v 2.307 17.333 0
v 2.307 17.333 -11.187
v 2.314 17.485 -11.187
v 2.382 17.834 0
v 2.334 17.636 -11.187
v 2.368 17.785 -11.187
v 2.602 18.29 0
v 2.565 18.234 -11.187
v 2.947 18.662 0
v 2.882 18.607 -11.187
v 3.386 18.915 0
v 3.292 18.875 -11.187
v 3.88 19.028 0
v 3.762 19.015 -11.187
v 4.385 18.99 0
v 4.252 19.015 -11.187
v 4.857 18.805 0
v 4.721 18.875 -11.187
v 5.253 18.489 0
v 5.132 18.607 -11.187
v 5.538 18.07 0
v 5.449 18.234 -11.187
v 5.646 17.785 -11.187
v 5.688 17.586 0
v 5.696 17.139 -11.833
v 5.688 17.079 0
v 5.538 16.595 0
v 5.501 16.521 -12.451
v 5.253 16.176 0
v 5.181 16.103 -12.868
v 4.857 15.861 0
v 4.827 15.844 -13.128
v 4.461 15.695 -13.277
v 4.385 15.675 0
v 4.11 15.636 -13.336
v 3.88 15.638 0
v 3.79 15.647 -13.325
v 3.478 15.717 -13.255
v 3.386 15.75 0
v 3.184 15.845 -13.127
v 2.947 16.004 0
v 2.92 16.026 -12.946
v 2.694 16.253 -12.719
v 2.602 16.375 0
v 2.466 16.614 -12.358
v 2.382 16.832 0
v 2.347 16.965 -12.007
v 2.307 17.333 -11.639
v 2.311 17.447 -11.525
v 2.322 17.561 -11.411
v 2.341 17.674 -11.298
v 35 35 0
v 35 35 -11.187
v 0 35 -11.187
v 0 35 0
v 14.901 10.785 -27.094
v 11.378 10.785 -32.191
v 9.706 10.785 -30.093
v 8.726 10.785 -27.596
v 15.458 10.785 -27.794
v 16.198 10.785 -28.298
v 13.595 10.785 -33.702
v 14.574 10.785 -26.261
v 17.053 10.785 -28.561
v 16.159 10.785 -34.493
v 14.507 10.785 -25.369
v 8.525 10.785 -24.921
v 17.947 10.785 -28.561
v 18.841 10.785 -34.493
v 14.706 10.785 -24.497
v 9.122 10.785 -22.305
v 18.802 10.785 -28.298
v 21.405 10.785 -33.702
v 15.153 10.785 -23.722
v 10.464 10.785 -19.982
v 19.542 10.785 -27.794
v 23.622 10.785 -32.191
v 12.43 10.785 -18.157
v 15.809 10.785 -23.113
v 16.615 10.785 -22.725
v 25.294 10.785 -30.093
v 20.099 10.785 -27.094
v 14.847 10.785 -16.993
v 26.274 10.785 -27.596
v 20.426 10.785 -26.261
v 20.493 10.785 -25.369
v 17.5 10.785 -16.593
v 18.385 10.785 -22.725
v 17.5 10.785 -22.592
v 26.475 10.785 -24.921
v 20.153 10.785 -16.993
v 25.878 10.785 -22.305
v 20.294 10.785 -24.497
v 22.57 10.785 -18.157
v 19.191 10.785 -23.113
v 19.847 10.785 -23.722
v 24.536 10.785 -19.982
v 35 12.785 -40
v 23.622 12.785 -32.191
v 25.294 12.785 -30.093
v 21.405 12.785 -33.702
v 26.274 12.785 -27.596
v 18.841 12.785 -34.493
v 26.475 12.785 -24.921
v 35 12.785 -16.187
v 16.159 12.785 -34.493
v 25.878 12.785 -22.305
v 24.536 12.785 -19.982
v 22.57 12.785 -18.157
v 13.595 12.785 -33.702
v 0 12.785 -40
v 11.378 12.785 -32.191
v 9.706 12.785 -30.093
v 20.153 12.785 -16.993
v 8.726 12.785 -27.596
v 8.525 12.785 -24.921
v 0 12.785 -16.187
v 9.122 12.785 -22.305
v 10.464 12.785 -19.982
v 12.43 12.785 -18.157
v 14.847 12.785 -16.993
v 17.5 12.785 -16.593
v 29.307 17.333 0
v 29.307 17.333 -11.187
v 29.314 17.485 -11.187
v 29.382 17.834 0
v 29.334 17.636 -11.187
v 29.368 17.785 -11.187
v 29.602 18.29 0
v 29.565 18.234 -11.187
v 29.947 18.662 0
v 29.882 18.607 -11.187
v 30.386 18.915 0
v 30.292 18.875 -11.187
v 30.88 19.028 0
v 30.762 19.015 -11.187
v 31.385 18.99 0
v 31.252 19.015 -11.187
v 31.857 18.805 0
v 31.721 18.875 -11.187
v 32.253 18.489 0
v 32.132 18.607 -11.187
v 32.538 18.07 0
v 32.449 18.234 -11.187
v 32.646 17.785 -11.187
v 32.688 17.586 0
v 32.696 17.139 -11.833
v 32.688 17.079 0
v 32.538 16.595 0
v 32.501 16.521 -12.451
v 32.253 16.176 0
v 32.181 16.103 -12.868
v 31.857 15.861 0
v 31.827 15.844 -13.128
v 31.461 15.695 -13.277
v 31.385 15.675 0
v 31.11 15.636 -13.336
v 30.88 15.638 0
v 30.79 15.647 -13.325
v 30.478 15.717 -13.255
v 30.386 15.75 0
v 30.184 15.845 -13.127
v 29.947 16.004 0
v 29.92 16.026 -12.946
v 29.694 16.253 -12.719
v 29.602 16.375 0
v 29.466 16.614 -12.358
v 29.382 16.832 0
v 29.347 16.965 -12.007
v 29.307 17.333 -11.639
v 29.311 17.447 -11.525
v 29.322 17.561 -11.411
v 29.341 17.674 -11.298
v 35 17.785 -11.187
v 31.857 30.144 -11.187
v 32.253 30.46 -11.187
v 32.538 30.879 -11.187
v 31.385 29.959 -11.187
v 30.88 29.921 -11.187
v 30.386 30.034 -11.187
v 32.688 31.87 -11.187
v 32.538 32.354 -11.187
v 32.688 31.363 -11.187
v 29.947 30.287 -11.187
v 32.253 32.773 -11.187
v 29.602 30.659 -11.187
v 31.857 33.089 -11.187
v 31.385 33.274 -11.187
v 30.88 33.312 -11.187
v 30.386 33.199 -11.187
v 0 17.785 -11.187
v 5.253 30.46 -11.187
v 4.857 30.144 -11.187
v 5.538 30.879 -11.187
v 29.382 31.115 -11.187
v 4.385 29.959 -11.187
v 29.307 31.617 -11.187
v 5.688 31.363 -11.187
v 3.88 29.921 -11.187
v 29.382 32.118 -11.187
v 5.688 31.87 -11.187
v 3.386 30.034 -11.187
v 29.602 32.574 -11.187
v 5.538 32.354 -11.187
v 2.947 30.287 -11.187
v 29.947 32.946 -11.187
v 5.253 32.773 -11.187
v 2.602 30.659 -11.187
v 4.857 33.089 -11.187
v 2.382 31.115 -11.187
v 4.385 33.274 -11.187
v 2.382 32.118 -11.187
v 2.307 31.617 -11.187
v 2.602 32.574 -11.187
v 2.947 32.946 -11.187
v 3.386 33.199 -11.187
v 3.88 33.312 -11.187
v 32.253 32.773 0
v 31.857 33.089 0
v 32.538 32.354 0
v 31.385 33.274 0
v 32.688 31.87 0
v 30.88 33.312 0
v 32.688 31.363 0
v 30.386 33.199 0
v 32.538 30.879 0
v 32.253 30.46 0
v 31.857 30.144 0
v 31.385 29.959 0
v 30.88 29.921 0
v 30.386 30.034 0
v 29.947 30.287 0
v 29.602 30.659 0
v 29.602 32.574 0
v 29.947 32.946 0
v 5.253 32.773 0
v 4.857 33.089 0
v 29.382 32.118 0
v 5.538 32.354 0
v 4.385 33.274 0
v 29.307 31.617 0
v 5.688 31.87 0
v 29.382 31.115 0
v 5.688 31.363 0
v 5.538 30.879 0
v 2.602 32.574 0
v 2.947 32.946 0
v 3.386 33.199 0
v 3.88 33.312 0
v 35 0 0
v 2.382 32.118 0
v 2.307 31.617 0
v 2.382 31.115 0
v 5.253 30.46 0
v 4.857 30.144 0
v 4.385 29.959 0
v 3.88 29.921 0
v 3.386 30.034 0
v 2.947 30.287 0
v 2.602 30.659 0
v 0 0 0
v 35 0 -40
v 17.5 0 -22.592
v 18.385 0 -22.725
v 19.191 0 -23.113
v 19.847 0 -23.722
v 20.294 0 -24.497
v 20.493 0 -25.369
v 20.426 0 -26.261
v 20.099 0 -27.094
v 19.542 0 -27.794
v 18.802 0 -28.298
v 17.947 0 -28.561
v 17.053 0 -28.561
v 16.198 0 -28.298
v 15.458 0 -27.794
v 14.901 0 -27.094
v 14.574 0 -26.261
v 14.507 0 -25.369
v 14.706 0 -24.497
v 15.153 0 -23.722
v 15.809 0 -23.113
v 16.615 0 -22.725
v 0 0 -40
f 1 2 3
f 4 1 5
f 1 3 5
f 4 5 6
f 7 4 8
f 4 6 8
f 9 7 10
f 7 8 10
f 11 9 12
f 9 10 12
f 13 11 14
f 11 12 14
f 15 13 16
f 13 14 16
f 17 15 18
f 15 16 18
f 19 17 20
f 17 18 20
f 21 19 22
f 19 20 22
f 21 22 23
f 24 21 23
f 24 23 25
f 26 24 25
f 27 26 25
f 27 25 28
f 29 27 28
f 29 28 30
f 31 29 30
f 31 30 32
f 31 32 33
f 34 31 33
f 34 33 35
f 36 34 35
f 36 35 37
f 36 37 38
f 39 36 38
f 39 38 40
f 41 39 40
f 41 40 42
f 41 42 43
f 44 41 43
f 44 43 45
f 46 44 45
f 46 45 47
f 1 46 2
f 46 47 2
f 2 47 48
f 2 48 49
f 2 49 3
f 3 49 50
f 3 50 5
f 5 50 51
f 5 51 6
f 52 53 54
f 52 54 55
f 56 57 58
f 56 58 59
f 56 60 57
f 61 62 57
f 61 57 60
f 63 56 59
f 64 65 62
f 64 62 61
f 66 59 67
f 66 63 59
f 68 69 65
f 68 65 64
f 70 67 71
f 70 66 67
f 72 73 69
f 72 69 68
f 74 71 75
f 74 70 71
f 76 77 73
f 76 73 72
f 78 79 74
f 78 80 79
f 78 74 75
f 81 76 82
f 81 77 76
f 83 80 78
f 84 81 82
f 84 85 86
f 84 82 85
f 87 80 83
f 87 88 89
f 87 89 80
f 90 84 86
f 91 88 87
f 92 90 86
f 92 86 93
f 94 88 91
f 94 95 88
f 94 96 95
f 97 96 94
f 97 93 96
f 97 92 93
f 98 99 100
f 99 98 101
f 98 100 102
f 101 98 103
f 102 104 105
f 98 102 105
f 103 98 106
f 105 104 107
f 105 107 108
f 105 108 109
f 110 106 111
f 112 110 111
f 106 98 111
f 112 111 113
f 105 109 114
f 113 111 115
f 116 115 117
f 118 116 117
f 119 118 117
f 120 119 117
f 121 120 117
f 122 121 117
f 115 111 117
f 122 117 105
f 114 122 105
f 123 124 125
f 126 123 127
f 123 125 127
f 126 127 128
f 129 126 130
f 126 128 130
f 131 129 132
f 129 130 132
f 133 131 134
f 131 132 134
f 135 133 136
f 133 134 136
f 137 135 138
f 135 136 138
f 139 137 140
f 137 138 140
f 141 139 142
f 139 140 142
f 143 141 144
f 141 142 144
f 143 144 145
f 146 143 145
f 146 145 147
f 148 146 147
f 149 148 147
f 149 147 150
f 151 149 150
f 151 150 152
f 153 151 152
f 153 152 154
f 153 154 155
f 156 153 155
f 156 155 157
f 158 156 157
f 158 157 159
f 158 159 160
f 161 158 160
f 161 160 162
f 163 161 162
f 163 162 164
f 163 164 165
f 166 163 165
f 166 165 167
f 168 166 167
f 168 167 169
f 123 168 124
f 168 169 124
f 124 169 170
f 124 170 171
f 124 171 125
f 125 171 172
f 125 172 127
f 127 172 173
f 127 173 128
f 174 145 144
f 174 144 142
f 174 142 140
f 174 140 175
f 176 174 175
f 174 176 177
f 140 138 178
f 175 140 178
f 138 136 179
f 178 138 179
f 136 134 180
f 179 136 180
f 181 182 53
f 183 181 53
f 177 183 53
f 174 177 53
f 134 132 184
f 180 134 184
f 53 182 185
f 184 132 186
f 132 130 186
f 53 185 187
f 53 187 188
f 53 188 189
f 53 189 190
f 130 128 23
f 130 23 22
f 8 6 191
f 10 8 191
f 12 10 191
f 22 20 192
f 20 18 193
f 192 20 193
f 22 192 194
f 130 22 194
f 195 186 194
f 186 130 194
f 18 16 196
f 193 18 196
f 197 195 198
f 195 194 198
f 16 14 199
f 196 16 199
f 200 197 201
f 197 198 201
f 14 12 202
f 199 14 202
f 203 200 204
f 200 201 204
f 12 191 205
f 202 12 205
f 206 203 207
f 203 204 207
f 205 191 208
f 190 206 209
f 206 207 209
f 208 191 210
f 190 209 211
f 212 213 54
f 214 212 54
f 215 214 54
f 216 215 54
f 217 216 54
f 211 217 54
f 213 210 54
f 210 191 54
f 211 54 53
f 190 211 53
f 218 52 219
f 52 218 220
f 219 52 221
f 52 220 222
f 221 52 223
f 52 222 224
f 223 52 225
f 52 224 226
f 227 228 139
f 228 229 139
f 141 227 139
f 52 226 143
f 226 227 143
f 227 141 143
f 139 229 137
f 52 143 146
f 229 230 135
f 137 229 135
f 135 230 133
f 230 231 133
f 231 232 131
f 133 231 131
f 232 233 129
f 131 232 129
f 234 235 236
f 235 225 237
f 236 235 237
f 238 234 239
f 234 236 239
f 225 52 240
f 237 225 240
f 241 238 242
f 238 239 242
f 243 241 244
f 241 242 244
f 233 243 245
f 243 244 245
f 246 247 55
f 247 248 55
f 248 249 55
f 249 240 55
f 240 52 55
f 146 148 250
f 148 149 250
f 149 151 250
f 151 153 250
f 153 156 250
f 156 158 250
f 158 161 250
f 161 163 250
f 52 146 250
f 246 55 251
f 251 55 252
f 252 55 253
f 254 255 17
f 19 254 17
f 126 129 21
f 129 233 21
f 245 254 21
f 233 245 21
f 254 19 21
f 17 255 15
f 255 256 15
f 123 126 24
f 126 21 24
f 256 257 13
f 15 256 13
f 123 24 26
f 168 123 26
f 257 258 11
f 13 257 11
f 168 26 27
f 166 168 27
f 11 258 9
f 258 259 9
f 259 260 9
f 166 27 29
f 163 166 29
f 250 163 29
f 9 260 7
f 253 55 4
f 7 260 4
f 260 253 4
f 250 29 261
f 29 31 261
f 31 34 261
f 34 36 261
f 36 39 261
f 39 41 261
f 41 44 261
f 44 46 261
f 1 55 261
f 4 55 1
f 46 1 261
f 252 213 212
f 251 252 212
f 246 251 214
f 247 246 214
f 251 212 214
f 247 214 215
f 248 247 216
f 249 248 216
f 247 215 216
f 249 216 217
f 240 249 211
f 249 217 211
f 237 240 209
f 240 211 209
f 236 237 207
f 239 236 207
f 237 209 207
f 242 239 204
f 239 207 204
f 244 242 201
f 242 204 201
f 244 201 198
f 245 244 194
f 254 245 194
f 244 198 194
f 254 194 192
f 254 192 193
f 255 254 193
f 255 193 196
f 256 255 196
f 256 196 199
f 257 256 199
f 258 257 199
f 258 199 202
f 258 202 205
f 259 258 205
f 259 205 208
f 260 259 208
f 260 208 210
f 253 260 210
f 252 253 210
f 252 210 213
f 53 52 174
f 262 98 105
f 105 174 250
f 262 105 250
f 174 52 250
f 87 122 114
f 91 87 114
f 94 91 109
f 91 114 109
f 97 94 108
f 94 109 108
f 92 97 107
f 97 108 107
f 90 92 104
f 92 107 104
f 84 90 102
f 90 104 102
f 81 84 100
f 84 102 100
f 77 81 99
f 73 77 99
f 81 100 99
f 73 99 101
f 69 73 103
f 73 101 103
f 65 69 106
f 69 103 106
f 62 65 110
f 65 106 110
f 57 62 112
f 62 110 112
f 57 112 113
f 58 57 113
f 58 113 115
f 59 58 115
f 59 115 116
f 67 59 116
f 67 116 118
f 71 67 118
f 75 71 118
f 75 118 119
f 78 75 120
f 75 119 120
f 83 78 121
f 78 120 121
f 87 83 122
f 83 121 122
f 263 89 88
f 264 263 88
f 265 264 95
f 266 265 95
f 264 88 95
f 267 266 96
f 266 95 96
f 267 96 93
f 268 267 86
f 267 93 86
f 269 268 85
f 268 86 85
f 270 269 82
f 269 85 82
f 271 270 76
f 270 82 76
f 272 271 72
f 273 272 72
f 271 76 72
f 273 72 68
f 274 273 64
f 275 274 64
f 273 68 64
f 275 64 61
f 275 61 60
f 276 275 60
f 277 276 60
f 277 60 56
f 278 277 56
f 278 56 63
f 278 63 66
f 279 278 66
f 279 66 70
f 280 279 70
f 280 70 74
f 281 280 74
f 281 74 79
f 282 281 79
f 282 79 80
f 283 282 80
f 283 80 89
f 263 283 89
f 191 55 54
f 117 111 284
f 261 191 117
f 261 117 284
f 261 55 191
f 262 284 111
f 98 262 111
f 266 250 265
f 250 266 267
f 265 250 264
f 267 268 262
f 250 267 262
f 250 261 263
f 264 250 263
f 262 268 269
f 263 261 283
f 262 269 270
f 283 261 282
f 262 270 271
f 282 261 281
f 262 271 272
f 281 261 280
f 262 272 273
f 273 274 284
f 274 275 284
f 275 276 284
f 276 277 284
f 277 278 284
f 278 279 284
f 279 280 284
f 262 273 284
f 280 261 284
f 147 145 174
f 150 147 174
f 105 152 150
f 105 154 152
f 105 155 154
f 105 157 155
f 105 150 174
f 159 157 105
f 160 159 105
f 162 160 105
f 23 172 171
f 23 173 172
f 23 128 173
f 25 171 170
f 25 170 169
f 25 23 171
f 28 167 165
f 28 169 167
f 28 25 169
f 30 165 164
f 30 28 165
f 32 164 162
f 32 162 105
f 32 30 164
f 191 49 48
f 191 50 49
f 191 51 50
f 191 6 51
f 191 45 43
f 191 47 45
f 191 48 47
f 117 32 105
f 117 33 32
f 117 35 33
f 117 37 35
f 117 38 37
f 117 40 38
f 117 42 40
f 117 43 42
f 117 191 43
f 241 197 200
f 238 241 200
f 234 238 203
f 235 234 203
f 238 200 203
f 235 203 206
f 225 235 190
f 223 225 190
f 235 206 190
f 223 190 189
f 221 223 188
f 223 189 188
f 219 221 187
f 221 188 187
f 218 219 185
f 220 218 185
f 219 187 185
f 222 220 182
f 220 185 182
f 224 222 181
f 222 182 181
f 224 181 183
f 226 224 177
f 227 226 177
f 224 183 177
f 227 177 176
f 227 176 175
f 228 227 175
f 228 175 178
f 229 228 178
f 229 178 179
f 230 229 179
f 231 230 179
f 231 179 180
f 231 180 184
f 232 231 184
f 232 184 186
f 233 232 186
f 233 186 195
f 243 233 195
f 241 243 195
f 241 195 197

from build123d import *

# Parameters (mm, degrees)
BOSS_EXTRUDE1_DEPTH = 35
SKETCH3_R           = 3.0015
CUT_EXTRUDE1_DEPTH  = 58.606470928
SKETCH3_5_R         = 9
CUT_EXTRUDE2_DEPTH  = 2
SKETCH4_R           = 1.7
CUT_EXTRUDE3_DEPTH  = 58.272989631
CHAMFER1_SIZE       = 5


with BuildPart() as part:
    # Sketch1 → Boss-Extrude1 (new body)
    with BuildSketch(Plane(origin=(0, 0, 0), x_dir=(0, 0, -1), z_dir=(1, 0, 0))):
        Polygon((0, 35), (0, 0), (40, 0), (40, 12.785016481), (11.186889421, 12.785016481), (11.186889421, 35), align=None)
    extrude(amount=BOSS_EXTRUDE1_DEPTH)

    # Sketch3 → Cut-Extrude1 (cut, through all)
    with BuildSketch(Plane(origin=(0, 12.785016481, 0), x_dir=(1, 0, 0), z_dir=(0, 1, 0))):
        with Locations(Location((17.5, 25.59344471, 0), (0, 0, 270))):
            Circle(SKETCH3_R)
    extrude(amount=-CUT_EXTRUDE1_DEPTH, mode=Mode.SUBTRACT)

    # Sketch3<5> → Cut-Extrude2 (cut)
    with BuildSketch(Plane(origin=(0, 12.785016481, 0), x_dir=(1, 0, 0), z_dir=(0, 1, 0))):
        with Locations(Location((17.5, 25.59344471, 0), (0, 0, 270))):
            Circle(SKETCH3_5_R)
    extrude(amount=-CUT_EXTRUDE2_DEPTH, mode=Mode.SUBTRACT)

    # Sketch4 → Cut-Extrude3 (cut, through all)
    with BuildSketch(Plane(origin=(0, 0, -11.186889421), x_dir=(-1, 0, 0), z_dir=(0, 0, -1))):
        with Locations((-31.00681869, 31.616501478)):
            Circle(SKETCH4_R)
        with Locations((-31.00681869, 17.332786674)):
            Circle(SKETCH4_R)
        with Locations((-4.00681869, 17.332786674)):
            Circle(SKETCH4_R)
        with Locations((-4.00681869, 31.616501478)):
            Circle(SKETCH4_R)
    extrude(amount=-CUT_EXTRUDE3_DEPTH, mode=Mode.SUBTRACT)

    # Chamfer1
    # the kernel refuses this chamfer: 5 mm, written as the material it adds along each edge
    with BuildSketch(Plane(origin=(0, 12.785016481, -11.186889421), x_dir=(0, 0.9996219169112968, 0.02749587661058631), z_dir=(1, 0, 0))) as chamfer1_piece_1_section:
        Polygon((CHAMFER1_SIZE * 0.999621916911, -CHAMFER1_SIZE * 0.0274958766106), (-CHAMFER1_SIZE * 0.0274958766106, -CHAMFER1_SIZE * 0.999621916911), (0, 0), align=None)
    chamfer1_piece_1 = extrude(amount=35, mode=Mode.PRIVATE)
    chamfer1_piece_1 = chamfer1_piece_1 - Plane(origin=(31.00681869, 17.332786674, -12.868450171), x_dir=(-1, 0, 0), z_dir=(0, 0, -1)) * Cylinder(1.7, 90, mode=Mode.PRIVATE)
    chamfer1_piece_1 = chamfer1_piece_1 - Plane(origin=(4.00681869, 17.332786674, -12.868450171), x_dir=(-1, 0, 0), z_dir=(0, 0, -1)) * Cylinder(1.7, 90, mode=Mode.PRIVATE)
    add(chamfer1_piece_1)


solid = part.part
